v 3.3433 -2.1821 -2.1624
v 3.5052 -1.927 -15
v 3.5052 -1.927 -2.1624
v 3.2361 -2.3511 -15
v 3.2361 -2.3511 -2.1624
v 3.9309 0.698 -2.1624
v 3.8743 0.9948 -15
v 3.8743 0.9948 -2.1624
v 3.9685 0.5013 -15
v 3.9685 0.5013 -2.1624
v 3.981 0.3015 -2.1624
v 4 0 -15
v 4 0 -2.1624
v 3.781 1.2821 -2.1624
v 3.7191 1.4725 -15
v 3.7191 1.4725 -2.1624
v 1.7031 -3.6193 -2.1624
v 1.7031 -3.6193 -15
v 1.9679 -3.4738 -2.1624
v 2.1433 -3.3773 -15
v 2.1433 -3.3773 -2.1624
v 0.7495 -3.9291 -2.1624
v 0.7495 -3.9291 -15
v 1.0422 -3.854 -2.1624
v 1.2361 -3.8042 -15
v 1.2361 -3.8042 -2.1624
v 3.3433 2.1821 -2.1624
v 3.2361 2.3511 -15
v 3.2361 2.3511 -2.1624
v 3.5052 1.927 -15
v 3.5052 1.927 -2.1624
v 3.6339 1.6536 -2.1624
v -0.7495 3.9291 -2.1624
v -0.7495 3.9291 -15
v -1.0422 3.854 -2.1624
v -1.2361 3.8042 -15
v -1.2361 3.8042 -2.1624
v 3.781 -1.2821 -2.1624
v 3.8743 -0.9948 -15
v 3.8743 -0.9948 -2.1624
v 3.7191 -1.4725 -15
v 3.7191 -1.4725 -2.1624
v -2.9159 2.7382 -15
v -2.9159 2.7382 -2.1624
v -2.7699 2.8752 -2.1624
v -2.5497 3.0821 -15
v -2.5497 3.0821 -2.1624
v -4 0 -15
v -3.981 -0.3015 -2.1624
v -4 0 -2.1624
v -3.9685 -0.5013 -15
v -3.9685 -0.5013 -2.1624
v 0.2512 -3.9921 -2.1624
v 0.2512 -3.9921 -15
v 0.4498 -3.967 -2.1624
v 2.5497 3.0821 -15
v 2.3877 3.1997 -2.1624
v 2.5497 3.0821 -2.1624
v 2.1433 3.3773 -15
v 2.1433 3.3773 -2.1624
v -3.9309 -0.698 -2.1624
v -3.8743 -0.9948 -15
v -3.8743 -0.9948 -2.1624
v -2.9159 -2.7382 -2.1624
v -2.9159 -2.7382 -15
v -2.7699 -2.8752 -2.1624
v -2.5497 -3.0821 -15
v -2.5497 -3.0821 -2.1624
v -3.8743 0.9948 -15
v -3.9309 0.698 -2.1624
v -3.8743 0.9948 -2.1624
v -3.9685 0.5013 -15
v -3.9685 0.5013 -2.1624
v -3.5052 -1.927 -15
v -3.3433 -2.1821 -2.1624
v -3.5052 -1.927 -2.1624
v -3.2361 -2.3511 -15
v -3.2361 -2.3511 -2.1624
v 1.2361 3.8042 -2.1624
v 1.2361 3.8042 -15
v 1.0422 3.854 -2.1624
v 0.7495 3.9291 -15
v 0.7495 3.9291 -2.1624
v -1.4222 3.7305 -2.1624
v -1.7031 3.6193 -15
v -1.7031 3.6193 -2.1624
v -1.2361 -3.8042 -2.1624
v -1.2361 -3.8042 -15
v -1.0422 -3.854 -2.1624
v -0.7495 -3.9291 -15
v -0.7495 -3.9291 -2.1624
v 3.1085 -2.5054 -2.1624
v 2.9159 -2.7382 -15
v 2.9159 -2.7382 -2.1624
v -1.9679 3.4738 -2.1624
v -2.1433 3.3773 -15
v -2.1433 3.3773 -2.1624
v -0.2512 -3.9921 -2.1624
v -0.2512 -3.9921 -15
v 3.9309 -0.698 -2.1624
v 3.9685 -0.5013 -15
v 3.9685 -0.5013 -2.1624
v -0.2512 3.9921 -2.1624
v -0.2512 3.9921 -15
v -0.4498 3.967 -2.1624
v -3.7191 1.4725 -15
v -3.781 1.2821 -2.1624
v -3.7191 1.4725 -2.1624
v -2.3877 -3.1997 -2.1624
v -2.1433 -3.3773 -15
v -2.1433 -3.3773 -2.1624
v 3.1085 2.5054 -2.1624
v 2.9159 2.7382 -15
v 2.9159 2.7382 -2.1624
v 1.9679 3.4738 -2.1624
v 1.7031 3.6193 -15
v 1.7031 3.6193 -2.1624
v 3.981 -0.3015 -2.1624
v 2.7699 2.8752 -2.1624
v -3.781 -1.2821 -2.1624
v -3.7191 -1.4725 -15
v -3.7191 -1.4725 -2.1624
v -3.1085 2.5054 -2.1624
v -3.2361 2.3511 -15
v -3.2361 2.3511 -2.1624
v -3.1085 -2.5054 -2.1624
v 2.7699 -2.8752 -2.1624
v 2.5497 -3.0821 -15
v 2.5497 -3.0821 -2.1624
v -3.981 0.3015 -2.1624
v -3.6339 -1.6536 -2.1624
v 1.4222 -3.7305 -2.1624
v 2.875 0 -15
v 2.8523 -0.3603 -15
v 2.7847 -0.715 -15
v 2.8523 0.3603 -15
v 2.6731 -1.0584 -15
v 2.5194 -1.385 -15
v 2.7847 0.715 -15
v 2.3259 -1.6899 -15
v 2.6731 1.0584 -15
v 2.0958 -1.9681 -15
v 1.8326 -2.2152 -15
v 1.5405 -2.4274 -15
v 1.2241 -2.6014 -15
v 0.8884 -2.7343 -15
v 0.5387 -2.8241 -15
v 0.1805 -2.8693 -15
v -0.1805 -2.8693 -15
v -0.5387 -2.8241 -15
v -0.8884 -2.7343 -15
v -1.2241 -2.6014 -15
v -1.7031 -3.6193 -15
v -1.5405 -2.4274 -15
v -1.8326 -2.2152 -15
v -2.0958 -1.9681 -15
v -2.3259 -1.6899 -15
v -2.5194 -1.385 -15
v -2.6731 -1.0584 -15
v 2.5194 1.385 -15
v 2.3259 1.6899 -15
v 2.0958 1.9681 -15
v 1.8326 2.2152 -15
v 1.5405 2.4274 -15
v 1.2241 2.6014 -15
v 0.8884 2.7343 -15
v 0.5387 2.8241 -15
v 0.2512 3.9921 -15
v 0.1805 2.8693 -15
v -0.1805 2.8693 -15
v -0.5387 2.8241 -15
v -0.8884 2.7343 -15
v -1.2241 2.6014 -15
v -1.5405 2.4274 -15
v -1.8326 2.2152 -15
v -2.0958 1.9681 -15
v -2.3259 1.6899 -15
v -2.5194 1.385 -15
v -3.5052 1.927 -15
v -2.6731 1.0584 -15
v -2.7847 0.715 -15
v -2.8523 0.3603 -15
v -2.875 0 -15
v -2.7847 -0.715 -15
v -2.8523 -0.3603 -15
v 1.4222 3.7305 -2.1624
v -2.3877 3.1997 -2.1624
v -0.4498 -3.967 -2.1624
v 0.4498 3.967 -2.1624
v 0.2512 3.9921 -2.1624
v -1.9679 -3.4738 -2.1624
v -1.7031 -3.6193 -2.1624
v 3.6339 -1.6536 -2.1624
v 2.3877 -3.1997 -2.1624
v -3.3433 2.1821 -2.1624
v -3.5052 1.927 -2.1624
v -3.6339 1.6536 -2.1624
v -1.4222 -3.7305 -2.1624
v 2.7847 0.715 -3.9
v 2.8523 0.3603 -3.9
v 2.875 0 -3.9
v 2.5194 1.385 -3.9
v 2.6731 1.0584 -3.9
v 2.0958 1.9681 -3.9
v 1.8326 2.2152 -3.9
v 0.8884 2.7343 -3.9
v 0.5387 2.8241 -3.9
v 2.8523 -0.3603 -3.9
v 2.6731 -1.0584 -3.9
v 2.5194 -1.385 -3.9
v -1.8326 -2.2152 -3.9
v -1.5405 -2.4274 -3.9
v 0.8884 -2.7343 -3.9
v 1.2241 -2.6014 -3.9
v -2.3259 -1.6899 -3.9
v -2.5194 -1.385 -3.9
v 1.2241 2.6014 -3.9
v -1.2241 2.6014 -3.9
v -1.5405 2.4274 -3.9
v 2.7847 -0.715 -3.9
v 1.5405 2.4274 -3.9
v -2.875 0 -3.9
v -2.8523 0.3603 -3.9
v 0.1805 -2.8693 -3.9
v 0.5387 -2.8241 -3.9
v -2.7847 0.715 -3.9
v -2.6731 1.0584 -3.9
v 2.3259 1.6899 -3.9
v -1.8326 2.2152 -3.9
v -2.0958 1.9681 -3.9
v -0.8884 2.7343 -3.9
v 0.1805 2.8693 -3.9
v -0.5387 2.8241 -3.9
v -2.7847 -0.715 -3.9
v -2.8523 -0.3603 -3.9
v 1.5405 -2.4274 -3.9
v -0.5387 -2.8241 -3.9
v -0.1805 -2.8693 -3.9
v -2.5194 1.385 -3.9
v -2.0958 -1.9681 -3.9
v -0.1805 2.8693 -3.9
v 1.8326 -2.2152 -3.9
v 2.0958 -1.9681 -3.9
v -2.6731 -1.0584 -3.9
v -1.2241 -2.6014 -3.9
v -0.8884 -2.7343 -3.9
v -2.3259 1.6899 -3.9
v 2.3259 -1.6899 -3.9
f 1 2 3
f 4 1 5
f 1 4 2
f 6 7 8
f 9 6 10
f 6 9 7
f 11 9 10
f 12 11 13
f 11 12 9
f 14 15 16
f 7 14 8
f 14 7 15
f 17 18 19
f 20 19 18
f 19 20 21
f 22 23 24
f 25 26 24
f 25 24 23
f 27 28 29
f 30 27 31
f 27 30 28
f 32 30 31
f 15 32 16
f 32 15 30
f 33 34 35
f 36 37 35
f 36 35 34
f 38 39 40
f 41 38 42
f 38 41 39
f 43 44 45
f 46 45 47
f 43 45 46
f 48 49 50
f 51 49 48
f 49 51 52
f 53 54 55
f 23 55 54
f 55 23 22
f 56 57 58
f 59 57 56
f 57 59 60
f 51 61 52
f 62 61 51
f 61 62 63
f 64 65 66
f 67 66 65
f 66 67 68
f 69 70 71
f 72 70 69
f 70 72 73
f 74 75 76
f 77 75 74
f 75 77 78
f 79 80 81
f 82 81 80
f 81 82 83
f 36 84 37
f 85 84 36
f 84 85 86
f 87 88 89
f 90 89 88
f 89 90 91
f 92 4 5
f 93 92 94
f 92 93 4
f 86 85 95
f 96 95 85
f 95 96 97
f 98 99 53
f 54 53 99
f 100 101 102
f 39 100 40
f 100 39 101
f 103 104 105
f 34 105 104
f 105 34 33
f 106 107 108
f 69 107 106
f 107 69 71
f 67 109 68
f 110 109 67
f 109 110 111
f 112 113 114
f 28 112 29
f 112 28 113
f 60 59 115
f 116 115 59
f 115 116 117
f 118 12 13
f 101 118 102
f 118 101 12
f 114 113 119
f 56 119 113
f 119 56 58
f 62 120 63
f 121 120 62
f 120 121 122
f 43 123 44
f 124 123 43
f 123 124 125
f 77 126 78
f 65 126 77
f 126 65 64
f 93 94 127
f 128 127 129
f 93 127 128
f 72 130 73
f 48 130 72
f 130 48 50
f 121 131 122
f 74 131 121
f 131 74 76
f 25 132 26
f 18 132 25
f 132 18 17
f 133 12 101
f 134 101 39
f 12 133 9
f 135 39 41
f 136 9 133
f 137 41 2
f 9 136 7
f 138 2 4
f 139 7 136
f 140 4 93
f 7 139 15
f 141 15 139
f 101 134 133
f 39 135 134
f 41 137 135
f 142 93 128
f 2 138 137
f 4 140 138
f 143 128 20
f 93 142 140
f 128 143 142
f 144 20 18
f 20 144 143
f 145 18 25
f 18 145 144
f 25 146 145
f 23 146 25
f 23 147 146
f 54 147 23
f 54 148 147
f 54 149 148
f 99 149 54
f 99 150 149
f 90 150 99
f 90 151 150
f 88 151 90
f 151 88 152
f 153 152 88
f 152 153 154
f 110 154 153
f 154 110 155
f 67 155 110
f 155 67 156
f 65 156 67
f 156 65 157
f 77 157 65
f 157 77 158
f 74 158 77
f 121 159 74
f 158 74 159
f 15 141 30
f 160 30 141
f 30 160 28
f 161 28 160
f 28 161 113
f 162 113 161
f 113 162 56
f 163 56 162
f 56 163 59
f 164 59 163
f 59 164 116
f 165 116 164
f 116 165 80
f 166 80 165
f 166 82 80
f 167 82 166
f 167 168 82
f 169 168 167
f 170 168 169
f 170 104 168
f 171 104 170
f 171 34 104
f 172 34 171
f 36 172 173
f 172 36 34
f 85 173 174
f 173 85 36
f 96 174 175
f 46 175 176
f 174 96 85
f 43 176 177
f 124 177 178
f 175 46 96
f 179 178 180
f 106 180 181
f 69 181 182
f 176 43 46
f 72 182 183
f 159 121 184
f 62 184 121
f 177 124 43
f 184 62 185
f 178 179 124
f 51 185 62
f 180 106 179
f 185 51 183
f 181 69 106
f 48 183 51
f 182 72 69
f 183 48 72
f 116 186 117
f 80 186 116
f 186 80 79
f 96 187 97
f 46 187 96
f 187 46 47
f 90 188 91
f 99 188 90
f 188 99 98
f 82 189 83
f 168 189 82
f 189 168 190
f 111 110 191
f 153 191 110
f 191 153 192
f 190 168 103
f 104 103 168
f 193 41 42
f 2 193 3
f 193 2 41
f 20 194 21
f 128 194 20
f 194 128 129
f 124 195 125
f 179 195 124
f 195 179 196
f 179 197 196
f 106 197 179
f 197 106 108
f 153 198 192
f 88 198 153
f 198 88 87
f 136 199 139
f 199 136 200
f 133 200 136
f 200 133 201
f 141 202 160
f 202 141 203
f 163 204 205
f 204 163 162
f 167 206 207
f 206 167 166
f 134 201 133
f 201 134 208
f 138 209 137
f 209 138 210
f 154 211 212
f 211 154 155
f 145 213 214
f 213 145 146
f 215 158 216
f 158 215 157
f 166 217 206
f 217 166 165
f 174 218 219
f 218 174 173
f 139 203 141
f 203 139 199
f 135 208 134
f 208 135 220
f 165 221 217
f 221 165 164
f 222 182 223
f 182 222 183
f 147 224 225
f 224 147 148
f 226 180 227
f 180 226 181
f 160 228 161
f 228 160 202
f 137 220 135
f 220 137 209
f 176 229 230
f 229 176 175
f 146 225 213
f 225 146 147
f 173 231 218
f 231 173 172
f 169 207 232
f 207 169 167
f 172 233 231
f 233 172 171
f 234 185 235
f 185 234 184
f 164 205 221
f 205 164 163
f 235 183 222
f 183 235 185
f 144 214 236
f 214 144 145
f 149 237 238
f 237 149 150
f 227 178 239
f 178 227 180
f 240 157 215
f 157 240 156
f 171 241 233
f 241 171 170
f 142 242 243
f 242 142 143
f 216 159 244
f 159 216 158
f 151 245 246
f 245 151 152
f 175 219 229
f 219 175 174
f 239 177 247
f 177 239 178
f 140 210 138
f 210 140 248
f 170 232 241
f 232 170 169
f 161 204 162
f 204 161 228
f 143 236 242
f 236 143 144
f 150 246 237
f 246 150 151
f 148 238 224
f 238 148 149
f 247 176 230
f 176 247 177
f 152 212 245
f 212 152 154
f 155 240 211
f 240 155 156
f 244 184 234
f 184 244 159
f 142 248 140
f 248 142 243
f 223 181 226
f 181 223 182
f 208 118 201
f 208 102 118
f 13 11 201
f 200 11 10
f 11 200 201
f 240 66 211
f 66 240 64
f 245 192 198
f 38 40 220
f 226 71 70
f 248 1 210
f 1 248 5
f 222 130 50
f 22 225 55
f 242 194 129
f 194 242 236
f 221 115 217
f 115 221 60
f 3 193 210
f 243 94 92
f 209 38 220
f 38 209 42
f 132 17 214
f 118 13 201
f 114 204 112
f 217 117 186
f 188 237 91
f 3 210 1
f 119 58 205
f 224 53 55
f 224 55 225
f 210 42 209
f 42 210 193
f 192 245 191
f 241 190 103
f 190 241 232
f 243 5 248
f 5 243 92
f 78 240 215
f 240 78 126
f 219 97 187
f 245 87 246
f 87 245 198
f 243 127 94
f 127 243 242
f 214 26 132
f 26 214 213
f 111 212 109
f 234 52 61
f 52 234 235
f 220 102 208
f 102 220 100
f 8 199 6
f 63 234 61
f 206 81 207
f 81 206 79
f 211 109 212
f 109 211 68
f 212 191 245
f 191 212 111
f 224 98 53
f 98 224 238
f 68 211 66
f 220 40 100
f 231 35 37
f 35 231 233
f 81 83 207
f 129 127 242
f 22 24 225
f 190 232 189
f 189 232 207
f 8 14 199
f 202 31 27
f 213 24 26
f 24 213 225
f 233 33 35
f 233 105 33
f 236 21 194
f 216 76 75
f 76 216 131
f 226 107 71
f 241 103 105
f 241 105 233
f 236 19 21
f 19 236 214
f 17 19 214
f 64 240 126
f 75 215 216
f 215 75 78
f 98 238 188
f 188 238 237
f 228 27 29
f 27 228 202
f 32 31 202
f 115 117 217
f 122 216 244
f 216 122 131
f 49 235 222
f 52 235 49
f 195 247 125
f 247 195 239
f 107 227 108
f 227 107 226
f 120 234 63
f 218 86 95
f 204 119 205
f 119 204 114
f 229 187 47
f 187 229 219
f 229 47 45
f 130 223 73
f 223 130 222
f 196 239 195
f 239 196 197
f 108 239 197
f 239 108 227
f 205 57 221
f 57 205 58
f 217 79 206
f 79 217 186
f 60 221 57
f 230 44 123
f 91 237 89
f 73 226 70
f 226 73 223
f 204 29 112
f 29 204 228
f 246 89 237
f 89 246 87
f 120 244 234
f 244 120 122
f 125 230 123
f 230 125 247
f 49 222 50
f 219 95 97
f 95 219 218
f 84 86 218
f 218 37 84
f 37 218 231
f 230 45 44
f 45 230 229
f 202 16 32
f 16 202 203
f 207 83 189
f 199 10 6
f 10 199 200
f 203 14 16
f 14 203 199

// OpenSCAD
$fn = 50;

difference() {
	union() {
		translate(v = [0, 0, -15.0]) {
			cylinder(h = 18, r = 4.0);
		}
		#translate(v = [0, 0, -18.0]) {
			cylinder(h = 18, r = 2.875);
		}
	}
	union() {
		translate(v = [0, 0, 0]) {
			rotate(a = [0, 0, 0]) {
				difference() {
					union() {
						translate(v = [0, 0, -18.0]) {
							cylinder(h = 18, r = 2.6);
						}
						translate(v = [0, 0, -3.9]) {
							cylinder(h = 3.9, r1 = 2.875, r2 = 5.4);
						}
						translate(v = [0, 0, -18.0]) {
							cylinder(h = 18, r = 2.875);
						}
						translate(v = [0, 0, -18.0]) {
							cylinder(h = 18, r = 2.6);
						}
					}
					union();
				}
			}
		}
		#cylinder(h = 3, r = 5.0);
	}
}
